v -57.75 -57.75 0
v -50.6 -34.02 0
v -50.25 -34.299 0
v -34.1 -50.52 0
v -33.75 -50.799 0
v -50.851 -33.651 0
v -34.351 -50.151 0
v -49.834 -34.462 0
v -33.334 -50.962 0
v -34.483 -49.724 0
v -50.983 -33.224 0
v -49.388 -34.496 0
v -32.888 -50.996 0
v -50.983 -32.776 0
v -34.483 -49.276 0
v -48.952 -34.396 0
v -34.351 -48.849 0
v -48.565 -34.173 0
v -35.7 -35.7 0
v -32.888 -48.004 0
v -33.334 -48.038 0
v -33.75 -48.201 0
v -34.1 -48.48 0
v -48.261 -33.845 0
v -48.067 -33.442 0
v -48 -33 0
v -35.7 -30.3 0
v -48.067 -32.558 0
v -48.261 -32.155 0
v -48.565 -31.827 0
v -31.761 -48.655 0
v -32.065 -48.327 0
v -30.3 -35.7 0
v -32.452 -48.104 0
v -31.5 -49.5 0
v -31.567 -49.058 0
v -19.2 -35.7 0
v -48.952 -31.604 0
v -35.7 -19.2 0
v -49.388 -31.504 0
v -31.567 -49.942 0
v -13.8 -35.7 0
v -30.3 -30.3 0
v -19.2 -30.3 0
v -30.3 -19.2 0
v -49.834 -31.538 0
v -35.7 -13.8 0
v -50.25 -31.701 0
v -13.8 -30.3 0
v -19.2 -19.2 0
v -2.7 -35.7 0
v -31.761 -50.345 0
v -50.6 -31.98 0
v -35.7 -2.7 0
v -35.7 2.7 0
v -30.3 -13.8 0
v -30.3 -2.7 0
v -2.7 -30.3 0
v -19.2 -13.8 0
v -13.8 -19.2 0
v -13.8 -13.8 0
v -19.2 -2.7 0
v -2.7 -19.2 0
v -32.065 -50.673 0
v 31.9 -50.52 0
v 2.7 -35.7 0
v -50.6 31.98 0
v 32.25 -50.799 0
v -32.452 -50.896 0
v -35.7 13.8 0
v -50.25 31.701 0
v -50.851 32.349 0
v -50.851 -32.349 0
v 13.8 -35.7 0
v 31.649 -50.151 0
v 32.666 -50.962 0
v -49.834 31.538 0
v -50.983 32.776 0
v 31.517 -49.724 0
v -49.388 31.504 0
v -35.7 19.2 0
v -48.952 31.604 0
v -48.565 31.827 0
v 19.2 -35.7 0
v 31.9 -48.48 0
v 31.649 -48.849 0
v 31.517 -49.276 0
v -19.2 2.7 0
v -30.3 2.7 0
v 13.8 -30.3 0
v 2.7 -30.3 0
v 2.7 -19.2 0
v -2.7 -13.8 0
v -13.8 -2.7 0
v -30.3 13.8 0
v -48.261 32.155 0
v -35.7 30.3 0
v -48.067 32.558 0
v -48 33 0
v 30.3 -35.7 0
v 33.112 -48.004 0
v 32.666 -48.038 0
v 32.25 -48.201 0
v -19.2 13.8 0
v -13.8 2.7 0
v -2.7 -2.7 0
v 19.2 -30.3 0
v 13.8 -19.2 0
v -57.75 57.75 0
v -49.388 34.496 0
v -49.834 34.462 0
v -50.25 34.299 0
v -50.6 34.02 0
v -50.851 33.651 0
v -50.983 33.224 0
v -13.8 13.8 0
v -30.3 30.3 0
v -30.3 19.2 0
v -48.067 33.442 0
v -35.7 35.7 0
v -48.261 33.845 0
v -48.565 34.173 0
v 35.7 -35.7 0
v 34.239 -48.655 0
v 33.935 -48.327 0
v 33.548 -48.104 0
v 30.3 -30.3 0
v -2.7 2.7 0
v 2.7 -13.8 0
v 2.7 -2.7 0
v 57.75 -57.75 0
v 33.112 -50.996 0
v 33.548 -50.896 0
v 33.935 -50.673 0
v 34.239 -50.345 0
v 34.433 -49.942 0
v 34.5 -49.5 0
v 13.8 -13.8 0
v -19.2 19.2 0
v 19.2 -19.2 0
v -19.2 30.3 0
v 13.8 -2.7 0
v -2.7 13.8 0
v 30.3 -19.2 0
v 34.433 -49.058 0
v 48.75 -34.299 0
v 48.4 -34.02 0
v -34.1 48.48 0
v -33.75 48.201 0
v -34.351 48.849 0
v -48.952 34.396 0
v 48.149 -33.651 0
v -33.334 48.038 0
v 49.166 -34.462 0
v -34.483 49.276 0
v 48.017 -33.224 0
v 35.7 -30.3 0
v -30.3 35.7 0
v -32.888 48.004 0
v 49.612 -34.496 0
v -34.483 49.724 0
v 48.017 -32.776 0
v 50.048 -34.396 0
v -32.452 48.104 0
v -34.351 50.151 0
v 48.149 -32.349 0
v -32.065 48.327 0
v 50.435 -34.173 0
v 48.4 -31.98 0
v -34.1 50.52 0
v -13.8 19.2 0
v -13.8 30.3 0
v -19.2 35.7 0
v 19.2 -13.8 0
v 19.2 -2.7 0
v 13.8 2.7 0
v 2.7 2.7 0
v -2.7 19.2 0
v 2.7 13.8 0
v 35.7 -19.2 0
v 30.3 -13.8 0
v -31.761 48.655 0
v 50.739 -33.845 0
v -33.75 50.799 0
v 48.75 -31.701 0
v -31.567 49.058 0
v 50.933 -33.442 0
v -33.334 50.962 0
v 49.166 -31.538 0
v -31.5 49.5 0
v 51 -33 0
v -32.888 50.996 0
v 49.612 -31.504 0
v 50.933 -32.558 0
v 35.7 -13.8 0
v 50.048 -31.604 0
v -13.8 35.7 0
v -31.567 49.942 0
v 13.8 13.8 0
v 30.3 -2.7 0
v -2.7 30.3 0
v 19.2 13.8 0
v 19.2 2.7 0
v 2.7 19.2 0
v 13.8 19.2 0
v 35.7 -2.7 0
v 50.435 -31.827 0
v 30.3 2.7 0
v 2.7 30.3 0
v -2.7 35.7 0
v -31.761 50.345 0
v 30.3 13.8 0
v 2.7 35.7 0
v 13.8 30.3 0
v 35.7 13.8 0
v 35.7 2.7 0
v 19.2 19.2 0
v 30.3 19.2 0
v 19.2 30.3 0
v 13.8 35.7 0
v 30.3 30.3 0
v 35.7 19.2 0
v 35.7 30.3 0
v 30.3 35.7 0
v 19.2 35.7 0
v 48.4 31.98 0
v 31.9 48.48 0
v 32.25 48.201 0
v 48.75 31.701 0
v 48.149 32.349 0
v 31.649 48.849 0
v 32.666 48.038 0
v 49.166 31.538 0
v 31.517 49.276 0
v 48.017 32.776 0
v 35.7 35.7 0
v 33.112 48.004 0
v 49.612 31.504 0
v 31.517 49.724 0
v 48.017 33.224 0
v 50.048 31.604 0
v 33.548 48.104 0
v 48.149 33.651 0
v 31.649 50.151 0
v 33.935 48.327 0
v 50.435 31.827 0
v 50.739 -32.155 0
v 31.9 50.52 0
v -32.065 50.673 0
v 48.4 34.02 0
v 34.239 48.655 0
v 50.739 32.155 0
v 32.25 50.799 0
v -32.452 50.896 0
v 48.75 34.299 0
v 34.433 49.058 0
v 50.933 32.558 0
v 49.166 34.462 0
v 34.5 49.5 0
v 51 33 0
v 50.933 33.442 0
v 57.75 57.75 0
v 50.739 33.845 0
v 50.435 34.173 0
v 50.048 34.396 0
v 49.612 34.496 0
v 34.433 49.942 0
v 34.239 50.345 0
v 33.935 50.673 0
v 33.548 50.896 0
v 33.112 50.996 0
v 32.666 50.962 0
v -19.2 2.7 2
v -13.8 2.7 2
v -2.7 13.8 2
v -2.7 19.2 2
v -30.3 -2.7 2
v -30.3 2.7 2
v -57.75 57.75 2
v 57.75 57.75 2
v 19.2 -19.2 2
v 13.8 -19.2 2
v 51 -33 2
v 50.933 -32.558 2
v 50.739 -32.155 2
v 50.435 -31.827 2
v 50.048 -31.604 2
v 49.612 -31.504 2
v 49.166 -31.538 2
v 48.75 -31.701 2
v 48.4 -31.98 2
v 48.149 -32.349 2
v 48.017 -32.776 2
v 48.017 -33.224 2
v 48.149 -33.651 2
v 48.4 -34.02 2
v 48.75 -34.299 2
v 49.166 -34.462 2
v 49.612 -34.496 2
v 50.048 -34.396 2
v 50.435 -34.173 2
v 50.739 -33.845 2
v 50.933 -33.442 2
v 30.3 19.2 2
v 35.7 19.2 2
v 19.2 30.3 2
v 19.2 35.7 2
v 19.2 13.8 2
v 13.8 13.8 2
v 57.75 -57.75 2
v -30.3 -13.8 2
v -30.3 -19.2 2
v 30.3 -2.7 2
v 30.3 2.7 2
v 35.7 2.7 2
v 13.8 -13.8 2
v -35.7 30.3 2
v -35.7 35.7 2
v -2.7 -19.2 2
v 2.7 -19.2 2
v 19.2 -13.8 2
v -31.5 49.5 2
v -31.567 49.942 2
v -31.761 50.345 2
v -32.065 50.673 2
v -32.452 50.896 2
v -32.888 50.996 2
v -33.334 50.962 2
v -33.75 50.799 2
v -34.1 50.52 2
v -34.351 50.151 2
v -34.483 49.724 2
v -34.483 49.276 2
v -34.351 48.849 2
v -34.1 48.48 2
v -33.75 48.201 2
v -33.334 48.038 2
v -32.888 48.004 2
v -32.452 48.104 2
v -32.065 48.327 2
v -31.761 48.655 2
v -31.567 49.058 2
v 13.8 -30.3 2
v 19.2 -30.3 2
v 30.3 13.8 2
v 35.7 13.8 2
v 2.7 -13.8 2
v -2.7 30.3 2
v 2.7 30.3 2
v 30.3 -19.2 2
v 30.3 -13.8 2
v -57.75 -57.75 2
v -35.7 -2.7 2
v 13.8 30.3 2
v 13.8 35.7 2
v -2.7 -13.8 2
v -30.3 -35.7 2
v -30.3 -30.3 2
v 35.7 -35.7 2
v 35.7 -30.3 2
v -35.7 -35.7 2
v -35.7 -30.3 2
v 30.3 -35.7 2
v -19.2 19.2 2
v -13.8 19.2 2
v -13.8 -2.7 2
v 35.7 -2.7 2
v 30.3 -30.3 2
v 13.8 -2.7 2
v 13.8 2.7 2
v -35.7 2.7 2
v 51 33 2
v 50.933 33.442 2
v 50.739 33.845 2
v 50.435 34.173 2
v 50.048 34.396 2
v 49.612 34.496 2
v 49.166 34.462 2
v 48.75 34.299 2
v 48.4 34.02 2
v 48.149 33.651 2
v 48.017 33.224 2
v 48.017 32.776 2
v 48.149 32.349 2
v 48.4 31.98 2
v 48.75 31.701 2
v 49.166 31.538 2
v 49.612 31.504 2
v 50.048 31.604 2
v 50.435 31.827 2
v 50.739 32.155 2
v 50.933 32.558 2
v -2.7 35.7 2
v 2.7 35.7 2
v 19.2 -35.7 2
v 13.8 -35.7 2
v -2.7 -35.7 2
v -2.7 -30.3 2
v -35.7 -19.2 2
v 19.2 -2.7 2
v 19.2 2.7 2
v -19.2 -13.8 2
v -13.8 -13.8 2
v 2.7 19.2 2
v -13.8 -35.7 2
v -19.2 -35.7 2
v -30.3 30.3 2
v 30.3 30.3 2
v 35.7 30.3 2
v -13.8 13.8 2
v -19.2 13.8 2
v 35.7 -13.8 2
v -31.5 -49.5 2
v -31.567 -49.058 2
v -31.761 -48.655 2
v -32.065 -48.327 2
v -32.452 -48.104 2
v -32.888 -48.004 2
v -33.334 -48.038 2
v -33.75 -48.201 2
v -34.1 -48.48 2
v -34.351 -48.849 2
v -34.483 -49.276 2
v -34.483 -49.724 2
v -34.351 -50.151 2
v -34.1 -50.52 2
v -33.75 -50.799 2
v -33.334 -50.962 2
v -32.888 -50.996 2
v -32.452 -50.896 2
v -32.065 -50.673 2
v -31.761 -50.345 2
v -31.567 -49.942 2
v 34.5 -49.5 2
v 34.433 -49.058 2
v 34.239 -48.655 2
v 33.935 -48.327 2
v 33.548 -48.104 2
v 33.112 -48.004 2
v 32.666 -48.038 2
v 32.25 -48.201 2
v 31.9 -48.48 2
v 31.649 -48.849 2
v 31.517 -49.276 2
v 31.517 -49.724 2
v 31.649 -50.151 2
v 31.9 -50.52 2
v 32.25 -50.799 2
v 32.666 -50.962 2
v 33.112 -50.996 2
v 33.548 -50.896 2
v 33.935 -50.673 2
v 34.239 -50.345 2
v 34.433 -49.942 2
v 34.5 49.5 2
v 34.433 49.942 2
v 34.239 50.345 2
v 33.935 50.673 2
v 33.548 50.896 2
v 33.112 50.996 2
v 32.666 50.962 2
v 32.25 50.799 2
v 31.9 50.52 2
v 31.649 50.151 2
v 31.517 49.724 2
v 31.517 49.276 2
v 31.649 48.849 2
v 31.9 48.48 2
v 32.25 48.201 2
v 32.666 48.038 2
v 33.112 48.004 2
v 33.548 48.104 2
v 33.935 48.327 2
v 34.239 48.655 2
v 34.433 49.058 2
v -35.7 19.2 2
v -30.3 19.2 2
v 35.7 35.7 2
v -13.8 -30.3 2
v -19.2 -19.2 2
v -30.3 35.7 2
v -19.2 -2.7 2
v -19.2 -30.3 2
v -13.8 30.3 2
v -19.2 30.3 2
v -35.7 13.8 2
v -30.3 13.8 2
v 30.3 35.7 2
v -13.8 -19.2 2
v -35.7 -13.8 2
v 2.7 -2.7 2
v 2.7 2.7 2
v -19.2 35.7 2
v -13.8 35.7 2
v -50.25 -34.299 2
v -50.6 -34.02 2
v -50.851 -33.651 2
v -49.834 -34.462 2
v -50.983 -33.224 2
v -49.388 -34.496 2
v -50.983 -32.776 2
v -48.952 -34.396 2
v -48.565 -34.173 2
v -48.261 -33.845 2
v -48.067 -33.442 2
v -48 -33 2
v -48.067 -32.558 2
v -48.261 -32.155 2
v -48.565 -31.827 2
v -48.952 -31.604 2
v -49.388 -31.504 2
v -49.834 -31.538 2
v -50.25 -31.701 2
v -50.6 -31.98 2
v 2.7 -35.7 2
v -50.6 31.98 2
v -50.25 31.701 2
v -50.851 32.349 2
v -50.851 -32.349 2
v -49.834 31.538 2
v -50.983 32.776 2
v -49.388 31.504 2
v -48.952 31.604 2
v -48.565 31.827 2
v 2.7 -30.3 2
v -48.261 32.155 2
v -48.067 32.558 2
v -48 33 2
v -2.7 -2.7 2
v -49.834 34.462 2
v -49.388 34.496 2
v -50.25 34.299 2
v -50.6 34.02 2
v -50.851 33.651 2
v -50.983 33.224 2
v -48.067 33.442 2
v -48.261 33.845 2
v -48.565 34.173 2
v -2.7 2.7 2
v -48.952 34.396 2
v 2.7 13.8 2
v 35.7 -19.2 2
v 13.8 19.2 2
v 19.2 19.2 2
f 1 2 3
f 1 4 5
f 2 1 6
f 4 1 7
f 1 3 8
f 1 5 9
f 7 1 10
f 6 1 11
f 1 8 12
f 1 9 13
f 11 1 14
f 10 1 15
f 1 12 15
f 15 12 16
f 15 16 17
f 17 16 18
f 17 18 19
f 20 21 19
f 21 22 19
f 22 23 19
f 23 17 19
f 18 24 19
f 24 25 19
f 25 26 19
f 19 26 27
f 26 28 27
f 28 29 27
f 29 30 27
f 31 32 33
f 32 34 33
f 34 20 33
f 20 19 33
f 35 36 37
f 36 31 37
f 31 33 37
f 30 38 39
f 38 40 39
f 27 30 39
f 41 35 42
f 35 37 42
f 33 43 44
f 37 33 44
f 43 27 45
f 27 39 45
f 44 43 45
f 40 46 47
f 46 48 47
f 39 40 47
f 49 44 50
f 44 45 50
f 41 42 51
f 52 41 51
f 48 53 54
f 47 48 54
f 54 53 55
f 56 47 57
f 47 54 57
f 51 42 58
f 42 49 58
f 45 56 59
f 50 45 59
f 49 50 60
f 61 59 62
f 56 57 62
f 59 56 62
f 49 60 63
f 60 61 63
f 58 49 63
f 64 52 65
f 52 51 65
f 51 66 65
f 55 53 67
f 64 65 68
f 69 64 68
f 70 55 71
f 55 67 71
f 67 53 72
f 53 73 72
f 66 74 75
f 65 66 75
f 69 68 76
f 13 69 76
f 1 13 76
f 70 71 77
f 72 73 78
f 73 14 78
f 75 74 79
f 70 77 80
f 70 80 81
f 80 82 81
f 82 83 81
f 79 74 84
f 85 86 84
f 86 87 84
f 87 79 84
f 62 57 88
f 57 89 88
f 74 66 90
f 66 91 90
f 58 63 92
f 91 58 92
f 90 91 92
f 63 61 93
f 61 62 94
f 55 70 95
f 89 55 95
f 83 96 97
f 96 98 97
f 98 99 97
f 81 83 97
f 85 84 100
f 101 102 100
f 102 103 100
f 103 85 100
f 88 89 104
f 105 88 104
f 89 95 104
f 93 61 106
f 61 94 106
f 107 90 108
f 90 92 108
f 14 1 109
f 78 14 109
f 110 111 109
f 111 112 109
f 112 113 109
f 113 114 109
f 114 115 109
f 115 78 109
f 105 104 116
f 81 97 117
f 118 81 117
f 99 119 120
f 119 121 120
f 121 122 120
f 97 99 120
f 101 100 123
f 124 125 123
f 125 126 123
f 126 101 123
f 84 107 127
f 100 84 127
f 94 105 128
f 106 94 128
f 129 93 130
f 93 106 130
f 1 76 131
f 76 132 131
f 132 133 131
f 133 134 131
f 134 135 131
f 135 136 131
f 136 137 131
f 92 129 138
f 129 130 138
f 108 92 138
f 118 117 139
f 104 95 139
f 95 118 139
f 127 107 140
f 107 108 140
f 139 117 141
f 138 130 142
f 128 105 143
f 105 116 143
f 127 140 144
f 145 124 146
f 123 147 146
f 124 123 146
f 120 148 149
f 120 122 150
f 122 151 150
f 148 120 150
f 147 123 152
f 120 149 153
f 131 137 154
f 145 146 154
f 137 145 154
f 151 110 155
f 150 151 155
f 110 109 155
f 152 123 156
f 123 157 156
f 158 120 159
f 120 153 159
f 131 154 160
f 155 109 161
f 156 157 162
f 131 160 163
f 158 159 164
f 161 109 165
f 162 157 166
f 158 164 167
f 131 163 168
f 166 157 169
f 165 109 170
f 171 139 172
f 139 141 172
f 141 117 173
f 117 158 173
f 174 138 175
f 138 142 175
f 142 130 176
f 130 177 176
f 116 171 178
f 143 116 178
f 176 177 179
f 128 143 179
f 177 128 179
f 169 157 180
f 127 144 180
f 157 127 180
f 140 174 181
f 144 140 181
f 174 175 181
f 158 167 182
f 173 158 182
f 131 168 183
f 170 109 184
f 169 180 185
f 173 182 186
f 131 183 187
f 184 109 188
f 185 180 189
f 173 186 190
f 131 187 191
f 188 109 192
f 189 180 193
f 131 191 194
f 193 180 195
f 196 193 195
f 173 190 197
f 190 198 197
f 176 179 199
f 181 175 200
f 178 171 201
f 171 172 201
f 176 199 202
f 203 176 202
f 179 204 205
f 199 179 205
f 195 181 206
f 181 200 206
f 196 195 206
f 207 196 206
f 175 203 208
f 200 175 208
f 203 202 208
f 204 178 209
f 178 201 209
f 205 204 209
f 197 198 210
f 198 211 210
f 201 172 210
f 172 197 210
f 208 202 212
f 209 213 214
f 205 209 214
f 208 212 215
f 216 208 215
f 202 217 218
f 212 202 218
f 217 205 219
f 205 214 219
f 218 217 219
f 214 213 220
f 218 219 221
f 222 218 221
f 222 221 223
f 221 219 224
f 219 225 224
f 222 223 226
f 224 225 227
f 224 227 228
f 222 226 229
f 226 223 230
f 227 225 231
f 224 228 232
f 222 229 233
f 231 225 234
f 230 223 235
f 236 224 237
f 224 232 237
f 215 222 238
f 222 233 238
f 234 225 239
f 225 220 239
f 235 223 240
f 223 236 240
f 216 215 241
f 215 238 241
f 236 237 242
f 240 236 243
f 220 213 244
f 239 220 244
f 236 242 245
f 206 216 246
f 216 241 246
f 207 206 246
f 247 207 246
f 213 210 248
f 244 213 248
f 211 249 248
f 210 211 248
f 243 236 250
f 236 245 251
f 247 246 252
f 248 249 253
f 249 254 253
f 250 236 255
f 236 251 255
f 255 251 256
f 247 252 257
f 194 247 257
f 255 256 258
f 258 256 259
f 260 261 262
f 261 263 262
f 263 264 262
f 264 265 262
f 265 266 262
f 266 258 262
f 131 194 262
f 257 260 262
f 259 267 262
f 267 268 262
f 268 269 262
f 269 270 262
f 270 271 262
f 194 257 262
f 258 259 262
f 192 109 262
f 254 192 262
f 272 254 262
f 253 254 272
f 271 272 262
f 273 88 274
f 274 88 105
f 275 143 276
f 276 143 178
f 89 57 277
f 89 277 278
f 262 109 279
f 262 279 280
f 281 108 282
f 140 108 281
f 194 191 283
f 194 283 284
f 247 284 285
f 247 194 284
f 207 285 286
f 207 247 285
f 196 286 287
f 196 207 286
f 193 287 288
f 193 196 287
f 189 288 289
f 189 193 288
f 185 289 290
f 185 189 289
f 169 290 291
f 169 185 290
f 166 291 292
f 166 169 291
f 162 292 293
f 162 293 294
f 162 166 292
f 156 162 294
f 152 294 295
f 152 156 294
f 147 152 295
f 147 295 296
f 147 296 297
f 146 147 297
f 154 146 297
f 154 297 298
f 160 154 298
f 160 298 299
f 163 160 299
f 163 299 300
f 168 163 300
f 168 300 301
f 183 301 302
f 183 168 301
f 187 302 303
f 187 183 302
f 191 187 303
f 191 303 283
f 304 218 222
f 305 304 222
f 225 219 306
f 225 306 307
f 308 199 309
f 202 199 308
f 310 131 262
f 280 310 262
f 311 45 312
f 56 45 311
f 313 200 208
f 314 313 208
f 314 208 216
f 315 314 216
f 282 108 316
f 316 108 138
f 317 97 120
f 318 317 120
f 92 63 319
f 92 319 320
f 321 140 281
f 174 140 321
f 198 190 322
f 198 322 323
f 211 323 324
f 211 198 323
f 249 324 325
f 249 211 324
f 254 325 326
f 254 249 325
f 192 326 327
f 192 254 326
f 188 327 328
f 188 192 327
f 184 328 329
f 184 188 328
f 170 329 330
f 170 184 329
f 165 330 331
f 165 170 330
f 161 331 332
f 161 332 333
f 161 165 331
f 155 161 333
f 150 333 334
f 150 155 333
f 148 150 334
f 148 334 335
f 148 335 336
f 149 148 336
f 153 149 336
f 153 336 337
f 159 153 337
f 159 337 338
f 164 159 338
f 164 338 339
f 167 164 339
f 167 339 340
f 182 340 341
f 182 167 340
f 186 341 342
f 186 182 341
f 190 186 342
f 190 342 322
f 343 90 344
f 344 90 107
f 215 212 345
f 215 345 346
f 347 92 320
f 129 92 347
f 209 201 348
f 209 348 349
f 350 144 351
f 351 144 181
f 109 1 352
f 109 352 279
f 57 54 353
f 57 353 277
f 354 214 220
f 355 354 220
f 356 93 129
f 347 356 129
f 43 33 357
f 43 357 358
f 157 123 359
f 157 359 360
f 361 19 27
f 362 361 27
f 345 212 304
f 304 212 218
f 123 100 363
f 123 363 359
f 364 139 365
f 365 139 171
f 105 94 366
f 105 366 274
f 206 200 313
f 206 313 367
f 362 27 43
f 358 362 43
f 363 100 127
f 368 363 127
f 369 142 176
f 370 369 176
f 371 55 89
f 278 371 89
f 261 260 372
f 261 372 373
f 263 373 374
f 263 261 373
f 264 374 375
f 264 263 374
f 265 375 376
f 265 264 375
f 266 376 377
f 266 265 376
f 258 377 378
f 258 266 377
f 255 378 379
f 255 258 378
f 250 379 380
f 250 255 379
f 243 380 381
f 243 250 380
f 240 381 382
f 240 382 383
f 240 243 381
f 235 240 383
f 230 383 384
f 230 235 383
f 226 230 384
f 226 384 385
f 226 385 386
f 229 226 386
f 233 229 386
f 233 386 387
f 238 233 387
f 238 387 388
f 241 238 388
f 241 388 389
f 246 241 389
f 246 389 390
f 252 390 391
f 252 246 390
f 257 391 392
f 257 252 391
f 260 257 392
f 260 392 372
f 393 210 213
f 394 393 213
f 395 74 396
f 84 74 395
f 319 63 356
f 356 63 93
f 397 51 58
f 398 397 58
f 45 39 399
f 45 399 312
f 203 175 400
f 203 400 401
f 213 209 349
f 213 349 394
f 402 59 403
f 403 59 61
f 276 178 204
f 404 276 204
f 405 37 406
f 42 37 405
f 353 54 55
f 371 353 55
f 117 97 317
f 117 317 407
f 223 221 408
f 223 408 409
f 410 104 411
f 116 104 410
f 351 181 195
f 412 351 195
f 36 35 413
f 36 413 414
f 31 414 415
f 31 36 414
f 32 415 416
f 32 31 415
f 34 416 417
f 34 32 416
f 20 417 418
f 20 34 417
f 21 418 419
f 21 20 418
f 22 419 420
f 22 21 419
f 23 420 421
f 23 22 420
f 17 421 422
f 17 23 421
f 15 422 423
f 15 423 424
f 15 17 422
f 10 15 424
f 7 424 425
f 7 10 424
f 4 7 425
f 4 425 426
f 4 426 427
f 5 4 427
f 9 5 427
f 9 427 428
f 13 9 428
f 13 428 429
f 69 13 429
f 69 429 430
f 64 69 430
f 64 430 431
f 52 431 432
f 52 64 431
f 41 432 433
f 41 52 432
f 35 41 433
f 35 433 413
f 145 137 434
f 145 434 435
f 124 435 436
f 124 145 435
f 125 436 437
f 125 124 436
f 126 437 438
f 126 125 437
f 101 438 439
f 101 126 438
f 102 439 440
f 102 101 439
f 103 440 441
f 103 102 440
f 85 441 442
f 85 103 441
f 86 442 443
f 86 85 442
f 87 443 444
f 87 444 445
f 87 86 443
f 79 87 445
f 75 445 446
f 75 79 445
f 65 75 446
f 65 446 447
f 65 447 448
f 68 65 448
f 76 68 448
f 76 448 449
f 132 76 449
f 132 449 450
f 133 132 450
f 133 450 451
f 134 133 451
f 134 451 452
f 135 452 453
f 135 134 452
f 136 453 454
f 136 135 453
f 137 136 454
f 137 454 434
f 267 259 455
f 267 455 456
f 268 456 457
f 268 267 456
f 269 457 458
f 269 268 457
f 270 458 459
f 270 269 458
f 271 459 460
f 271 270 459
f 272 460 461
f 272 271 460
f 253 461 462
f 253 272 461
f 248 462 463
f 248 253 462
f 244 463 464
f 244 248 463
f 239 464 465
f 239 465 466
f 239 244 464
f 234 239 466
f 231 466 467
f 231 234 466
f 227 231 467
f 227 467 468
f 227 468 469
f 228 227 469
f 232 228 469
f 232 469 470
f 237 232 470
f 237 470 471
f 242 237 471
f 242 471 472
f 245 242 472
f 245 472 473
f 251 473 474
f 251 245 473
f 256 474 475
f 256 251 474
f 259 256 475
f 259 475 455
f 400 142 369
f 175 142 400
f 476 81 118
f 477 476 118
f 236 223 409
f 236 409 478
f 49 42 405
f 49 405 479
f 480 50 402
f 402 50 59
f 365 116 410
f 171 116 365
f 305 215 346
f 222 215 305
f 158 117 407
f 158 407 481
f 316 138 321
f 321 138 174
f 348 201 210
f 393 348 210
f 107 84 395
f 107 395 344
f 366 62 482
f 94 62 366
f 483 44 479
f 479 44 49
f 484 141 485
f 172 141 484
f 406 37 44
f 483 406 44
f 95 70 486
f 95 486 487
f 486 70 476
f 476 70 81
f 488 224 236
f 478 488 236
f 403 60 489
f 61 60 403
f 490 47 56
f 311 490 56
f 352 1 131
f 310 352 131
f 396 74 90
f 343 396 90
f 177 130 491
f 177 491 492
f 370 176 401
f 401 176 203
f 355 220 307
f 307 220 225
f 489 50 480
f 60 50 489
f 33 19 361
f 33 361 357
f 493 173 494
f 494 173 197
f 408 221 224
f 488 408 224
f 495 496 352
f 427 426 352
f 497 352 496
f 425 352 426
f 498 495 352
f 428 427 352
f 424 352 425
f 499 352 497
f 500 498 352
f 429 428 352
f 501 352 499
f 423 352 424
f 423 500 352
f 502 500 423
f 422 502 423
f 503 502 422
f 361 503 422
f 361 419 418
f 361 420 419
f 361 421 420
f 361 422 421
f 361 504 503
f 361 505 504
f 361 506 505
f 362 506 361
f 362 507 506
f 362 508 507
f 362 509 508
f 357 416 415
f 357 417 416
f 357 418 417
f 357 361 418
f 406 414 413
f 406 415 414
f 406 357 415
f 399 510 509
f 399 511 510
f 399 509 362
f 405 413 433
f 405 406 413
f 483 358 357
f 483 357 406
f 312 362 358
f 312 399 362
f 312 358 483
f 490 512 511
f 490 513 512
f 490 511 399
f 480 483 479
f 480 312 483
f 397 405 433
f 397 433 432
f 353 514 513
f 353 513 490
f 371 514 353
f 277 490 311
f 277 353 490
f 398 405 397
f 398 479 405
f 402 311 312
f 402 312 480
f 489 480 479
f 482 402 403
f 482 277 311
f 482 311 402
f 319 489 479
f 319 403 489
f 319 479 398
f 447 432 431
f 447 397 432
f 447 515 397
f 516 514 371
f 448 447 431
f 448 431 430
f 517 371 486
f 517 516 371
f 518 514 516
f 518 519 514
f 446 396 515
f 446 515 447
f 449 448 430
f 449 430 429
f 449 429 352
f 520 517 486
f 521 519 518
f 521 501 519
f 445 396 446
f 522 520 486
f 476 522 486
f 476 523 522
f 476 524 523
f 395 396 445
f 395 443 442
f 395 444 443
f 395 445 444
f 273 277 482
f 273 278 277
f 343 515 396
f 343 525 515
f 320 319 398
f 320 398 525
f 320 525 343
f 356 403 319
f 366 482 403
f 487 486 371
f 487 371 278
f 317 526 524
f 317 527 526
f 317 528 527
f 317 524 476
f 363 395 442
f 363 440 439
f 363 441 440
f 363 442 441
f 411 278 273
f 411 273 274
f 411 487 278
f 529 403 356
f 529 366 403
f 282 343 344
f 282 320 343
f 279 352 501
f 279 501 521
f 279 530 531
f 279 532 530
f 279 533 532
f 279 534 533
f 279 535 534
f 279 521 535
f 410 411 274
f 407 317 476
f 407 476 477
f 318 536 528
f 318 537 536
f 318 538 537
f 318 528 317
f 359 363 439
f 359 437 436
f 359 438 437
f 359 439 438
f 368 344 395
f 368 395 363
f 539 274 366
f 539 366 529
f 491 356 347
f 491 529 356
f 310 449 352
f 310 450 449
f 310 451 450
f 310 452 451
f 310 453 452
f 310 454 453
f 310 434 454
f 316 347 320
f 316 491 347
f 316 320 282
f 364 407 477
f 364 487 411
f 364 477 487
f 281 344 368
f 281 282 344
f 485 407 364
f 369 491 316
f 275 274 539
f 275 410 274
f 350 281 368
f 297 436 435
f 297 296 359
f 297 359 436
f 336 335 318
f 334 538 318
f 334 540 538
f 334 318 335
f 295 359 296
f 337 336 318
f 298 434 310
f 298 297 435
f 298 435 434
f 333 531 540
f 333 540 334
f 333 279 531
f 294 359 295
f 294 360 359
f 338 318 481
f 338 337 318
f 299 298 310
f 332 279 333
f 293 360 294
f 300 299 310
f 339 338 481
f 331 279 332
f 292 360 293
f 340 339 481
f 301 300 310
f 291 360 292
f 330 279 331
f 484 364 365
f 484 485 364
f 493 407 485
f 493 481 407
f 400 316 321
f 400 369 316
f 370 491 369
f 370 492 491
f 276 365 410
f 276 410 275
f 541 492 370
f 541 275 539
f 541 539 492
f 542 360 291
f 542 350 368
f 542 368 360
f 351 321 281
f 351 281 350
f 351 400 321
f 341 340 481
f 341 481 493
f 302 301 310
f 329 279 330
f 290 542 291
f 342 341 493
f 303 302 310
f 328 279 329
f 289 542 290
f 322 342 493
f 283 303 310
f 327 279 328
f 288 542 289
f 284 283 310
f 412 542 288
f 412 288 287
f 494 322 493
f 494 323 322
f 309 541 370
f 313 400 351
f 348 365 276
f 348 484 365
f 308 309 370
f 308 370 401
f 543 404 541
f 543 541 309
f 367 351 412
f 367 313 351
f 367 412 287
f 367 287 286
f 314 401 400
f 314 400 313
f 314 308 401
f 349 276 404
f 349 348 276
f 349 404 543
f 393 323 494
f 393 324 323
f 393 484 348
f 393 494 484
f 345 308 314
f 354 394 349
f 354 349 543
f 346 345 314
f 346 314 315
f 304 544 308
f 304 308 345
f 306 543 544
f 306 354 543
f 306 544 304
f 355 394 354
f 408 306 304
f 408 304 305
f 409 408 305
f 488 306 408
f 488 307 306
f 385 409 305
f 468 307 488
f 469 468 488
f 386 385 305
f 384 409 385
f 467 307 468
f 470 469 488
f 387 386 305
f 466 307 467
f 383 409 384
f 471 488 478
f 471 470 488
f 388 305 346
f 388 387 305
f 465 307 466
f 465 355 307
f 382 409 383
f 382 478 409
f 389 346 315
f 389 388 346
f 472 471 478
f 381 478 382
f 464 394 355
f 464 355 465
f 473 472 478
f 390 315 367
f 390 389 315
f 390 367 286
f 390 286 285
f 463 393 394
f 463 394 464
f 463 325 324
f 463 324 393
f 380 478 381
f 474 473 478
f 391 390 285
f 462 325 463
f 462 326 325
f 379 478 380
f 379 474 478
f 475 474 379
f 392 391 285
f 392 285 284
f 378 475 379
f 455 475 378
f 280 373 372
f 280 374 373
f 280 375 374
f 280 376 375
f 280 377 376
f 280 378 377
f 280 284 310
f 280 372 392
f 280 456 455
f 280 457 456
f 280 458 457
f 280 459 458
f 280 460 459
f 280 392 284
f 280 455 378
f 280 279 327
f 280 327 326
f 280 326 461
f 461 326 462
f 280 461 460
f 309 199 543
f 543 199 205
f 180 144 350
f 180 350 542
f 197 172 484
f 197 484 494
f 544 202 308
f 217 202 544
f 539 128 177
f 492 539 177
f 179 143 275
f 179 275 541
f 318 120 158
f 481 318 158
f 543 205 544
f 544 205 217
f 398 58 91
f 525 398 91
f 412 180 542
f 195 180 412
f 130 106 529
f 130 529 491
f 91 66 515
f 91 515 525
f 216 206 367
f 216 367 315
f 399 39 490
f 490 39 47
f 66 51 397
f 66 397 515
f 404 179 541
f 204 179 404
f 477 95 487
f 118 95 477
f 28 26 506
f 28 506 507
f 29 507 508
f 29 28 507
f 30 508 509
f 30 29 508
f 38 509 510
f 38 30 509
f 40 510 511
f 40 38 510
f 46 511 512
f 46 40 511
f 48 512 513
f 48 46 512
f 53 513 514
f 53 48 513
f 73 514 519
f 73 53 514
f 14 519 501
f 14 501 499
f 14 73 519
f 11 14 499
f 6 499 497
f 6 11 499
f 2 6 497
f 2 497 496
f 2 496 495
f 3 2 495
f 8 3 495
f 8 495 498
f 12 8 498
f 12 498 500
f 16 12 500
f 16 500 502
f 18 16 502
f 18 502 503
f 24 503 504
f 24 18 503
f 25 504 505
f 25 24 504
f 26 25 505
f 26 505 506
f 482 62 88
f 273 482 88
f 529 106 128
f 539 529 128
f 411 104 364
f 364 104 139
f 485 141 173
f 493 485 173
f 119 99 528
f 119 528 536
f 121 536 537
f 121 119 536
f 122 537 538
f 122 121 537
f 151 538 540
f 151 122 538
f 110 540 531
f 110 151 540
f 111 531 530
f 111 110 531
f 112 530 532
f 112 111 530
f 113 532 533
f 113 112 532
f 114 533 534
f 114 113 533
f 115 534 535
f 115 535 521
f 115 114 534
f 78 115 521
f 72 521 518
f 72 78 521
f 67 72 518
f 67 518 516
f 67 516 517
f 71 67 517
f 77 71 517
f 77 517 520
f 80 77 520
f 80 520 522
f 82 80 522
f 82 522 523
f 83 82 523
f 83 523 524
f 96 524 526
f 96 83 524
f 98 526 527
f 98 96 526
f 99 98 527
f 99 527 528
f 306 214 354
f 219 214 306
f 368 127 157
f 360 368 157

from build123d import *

# Parameters (mm, degrees)
SKETCH_W   = 115.5
SKETCH_H   = 115.5
SKETCH_R   = 1.5
SKETCH_W_2 = 5.4
SKETCH_H_2 = 5.4
PAD_DEPTH  = 2


with BuildPart() as part:
    # Sketch → Pad (new body)
    with BuildSketch(Plane.XY):
        Rectangle(SKETCH_W, SKETCH_H)
        with Locations((-49.5, 33)):
            Circle(SKETCH_R, mode=Mode.SUBTRACT)
        with Locations((-33, 49.5)):
            Circle(SKETCH_R, mode=Mode.SUBTRACT)
        with Locations((33, 49.5)):
            Circle(SKETCH_R, mode=Mode.SUBTRACT)
        with Locations((49.5, 33)):
            Circle(SKETCH_R, mode=Mode.SUBTRACT)
        with Locations((49.5, -33)):
            Circle(SKETCH_R, mode=Mode.SUBTRACT)
        with Locations((33, -49.5)):
            Circle(SKETCH_R, mode=Mode.SUBTRACT)
        with Locations((-33, -49.5)):
            Circle(SKETCH_R, mode=Mode.SUBTRACT)
        with Locations((-49.5, -33)):
            Circle(SKETCH_R, mode=Mode.SUBTRACT)
        Rectangle(SKETCH_W_2, SKETCH_H_2, mode=Mode.SUBTRACT)
        with Locations((-16.5, 0)):
            Rectangle(SKETCH_W_2, SKETCH_H_2, mode=Mode.SUBTRACT)
        with Locations((-33, 0)):
            Rectangle(SKETCH_W_2, SKETCH_H_2, mode=Mode.SUBTRACT)
        with Locations((16.5, 0)):
            Rectangle(SKETCH_W_2, SKETCH_H_2, mode=Mode.SUBTRACT)
        with Locations((33, 0)):
            Rectangle(SKETCH_W_2, SKETCH_H_2, mode=Mode.SUBTRACT)
        with Locations((0, -16.5)):
            Rectangle(SKETCH_W_2, SKETCH_H_2, mode=Mode.SUBTRACT)
        with Locations((-16.5, -16.5)):
            Rectangle(SKETCH_W_2, SKETCH_H_2, mode=Mode.SUBTRACT)
        with Locations((-33, -16.5)):
            Rectangle(SKETCH_W_2, SKETCH_H_2, mode=Mode.SUBTRACT)
        with Locations((16.5, -16.5)):
            Rectangle(SKETCH_W_2, SKETCH_H_2, mode=Mode.SUBTRACT)
        with Locations((33, -16.5)):
            Rectangle(SKETCH_W_2, SKETCH_H_2, mode=Mode.SUBTRACT)
        with Locations((0, 16.5)):
            Rectangle(SKETCH_W_2, SKETCH_H_2, mode=Mode.SUBTRACT)
        with Locations((-16.5, 16.5)):
            Rectangle(SKETCH_W_2, SKETCH_H_2, mode=Mode.SUBTRACT)
        with Locations((-33, 16.5)):
            Rectangle(SKETCH_W_2, SKETCH_H_2, mode=Mode.SUBTRACT)
        with Locations((16.5, 16.5)):
            Rectangle(SKETCH_W_2, SKETCH_H_2, mode=Mode.SUBTRACT)
        with Locations((33, 16.5)):
            Rectangle(SKETCH_W_2, SKETCH_H_2, mode=Mode.SUBTRACT)
        with Locations((0, 33)):
            Rectangle(SKETCH_W_2, SKETCH_H_2, mode=Mode.SUBTRACT)
        with Locations((-16.5, 33)):
            Rectangle(SKETCH_W_2, SKETCH_H_2, mode=Mode.SUBTRACT)
        with Locations((-33, 33)):
            Rectangle(SKETCH_W_2, SKETCH_H_2, mode=Mode.SUBTRACT)
        with Locations((16.5, 33)):
            Rectangle(SKETCH_W_2, SKETCH_H_2, mode=Mode.SUBTRACT)
        with Locations((33, 33)):
            Rectangle(SKETCH_W_2, SKETCH_H_2, mode=Mode.SUBTRACT)
        with Locations((0, -33)):
            Rectangle(SKETCH_W_2, SKETCH_H_2, mode=Mode.SUBTRACT)
        with Locations((-16.5, -33)):
            Rectangle(SKETCH_W_2, SKETCH_H_2, mode=Mode.SUBTRACT)
        with Locations((-33, -33)):
            Rectangle(SKETCH_W_2, SKETCH_H_2, mode=Mode.SUBTRACT)
        with Locations((16.5, -33)):
            Rectangle(SKETCH_W_2, SKETCH_H_2, mode=Mode.SUBTRACT)
        with Locations((33, -33)):
            Rectangle(SKETCH_W_2, SKETCH_H_2, mode=Mode.SUBTRACT)
    extrude(amount=PAD_DEPTH)


solid = part.part
